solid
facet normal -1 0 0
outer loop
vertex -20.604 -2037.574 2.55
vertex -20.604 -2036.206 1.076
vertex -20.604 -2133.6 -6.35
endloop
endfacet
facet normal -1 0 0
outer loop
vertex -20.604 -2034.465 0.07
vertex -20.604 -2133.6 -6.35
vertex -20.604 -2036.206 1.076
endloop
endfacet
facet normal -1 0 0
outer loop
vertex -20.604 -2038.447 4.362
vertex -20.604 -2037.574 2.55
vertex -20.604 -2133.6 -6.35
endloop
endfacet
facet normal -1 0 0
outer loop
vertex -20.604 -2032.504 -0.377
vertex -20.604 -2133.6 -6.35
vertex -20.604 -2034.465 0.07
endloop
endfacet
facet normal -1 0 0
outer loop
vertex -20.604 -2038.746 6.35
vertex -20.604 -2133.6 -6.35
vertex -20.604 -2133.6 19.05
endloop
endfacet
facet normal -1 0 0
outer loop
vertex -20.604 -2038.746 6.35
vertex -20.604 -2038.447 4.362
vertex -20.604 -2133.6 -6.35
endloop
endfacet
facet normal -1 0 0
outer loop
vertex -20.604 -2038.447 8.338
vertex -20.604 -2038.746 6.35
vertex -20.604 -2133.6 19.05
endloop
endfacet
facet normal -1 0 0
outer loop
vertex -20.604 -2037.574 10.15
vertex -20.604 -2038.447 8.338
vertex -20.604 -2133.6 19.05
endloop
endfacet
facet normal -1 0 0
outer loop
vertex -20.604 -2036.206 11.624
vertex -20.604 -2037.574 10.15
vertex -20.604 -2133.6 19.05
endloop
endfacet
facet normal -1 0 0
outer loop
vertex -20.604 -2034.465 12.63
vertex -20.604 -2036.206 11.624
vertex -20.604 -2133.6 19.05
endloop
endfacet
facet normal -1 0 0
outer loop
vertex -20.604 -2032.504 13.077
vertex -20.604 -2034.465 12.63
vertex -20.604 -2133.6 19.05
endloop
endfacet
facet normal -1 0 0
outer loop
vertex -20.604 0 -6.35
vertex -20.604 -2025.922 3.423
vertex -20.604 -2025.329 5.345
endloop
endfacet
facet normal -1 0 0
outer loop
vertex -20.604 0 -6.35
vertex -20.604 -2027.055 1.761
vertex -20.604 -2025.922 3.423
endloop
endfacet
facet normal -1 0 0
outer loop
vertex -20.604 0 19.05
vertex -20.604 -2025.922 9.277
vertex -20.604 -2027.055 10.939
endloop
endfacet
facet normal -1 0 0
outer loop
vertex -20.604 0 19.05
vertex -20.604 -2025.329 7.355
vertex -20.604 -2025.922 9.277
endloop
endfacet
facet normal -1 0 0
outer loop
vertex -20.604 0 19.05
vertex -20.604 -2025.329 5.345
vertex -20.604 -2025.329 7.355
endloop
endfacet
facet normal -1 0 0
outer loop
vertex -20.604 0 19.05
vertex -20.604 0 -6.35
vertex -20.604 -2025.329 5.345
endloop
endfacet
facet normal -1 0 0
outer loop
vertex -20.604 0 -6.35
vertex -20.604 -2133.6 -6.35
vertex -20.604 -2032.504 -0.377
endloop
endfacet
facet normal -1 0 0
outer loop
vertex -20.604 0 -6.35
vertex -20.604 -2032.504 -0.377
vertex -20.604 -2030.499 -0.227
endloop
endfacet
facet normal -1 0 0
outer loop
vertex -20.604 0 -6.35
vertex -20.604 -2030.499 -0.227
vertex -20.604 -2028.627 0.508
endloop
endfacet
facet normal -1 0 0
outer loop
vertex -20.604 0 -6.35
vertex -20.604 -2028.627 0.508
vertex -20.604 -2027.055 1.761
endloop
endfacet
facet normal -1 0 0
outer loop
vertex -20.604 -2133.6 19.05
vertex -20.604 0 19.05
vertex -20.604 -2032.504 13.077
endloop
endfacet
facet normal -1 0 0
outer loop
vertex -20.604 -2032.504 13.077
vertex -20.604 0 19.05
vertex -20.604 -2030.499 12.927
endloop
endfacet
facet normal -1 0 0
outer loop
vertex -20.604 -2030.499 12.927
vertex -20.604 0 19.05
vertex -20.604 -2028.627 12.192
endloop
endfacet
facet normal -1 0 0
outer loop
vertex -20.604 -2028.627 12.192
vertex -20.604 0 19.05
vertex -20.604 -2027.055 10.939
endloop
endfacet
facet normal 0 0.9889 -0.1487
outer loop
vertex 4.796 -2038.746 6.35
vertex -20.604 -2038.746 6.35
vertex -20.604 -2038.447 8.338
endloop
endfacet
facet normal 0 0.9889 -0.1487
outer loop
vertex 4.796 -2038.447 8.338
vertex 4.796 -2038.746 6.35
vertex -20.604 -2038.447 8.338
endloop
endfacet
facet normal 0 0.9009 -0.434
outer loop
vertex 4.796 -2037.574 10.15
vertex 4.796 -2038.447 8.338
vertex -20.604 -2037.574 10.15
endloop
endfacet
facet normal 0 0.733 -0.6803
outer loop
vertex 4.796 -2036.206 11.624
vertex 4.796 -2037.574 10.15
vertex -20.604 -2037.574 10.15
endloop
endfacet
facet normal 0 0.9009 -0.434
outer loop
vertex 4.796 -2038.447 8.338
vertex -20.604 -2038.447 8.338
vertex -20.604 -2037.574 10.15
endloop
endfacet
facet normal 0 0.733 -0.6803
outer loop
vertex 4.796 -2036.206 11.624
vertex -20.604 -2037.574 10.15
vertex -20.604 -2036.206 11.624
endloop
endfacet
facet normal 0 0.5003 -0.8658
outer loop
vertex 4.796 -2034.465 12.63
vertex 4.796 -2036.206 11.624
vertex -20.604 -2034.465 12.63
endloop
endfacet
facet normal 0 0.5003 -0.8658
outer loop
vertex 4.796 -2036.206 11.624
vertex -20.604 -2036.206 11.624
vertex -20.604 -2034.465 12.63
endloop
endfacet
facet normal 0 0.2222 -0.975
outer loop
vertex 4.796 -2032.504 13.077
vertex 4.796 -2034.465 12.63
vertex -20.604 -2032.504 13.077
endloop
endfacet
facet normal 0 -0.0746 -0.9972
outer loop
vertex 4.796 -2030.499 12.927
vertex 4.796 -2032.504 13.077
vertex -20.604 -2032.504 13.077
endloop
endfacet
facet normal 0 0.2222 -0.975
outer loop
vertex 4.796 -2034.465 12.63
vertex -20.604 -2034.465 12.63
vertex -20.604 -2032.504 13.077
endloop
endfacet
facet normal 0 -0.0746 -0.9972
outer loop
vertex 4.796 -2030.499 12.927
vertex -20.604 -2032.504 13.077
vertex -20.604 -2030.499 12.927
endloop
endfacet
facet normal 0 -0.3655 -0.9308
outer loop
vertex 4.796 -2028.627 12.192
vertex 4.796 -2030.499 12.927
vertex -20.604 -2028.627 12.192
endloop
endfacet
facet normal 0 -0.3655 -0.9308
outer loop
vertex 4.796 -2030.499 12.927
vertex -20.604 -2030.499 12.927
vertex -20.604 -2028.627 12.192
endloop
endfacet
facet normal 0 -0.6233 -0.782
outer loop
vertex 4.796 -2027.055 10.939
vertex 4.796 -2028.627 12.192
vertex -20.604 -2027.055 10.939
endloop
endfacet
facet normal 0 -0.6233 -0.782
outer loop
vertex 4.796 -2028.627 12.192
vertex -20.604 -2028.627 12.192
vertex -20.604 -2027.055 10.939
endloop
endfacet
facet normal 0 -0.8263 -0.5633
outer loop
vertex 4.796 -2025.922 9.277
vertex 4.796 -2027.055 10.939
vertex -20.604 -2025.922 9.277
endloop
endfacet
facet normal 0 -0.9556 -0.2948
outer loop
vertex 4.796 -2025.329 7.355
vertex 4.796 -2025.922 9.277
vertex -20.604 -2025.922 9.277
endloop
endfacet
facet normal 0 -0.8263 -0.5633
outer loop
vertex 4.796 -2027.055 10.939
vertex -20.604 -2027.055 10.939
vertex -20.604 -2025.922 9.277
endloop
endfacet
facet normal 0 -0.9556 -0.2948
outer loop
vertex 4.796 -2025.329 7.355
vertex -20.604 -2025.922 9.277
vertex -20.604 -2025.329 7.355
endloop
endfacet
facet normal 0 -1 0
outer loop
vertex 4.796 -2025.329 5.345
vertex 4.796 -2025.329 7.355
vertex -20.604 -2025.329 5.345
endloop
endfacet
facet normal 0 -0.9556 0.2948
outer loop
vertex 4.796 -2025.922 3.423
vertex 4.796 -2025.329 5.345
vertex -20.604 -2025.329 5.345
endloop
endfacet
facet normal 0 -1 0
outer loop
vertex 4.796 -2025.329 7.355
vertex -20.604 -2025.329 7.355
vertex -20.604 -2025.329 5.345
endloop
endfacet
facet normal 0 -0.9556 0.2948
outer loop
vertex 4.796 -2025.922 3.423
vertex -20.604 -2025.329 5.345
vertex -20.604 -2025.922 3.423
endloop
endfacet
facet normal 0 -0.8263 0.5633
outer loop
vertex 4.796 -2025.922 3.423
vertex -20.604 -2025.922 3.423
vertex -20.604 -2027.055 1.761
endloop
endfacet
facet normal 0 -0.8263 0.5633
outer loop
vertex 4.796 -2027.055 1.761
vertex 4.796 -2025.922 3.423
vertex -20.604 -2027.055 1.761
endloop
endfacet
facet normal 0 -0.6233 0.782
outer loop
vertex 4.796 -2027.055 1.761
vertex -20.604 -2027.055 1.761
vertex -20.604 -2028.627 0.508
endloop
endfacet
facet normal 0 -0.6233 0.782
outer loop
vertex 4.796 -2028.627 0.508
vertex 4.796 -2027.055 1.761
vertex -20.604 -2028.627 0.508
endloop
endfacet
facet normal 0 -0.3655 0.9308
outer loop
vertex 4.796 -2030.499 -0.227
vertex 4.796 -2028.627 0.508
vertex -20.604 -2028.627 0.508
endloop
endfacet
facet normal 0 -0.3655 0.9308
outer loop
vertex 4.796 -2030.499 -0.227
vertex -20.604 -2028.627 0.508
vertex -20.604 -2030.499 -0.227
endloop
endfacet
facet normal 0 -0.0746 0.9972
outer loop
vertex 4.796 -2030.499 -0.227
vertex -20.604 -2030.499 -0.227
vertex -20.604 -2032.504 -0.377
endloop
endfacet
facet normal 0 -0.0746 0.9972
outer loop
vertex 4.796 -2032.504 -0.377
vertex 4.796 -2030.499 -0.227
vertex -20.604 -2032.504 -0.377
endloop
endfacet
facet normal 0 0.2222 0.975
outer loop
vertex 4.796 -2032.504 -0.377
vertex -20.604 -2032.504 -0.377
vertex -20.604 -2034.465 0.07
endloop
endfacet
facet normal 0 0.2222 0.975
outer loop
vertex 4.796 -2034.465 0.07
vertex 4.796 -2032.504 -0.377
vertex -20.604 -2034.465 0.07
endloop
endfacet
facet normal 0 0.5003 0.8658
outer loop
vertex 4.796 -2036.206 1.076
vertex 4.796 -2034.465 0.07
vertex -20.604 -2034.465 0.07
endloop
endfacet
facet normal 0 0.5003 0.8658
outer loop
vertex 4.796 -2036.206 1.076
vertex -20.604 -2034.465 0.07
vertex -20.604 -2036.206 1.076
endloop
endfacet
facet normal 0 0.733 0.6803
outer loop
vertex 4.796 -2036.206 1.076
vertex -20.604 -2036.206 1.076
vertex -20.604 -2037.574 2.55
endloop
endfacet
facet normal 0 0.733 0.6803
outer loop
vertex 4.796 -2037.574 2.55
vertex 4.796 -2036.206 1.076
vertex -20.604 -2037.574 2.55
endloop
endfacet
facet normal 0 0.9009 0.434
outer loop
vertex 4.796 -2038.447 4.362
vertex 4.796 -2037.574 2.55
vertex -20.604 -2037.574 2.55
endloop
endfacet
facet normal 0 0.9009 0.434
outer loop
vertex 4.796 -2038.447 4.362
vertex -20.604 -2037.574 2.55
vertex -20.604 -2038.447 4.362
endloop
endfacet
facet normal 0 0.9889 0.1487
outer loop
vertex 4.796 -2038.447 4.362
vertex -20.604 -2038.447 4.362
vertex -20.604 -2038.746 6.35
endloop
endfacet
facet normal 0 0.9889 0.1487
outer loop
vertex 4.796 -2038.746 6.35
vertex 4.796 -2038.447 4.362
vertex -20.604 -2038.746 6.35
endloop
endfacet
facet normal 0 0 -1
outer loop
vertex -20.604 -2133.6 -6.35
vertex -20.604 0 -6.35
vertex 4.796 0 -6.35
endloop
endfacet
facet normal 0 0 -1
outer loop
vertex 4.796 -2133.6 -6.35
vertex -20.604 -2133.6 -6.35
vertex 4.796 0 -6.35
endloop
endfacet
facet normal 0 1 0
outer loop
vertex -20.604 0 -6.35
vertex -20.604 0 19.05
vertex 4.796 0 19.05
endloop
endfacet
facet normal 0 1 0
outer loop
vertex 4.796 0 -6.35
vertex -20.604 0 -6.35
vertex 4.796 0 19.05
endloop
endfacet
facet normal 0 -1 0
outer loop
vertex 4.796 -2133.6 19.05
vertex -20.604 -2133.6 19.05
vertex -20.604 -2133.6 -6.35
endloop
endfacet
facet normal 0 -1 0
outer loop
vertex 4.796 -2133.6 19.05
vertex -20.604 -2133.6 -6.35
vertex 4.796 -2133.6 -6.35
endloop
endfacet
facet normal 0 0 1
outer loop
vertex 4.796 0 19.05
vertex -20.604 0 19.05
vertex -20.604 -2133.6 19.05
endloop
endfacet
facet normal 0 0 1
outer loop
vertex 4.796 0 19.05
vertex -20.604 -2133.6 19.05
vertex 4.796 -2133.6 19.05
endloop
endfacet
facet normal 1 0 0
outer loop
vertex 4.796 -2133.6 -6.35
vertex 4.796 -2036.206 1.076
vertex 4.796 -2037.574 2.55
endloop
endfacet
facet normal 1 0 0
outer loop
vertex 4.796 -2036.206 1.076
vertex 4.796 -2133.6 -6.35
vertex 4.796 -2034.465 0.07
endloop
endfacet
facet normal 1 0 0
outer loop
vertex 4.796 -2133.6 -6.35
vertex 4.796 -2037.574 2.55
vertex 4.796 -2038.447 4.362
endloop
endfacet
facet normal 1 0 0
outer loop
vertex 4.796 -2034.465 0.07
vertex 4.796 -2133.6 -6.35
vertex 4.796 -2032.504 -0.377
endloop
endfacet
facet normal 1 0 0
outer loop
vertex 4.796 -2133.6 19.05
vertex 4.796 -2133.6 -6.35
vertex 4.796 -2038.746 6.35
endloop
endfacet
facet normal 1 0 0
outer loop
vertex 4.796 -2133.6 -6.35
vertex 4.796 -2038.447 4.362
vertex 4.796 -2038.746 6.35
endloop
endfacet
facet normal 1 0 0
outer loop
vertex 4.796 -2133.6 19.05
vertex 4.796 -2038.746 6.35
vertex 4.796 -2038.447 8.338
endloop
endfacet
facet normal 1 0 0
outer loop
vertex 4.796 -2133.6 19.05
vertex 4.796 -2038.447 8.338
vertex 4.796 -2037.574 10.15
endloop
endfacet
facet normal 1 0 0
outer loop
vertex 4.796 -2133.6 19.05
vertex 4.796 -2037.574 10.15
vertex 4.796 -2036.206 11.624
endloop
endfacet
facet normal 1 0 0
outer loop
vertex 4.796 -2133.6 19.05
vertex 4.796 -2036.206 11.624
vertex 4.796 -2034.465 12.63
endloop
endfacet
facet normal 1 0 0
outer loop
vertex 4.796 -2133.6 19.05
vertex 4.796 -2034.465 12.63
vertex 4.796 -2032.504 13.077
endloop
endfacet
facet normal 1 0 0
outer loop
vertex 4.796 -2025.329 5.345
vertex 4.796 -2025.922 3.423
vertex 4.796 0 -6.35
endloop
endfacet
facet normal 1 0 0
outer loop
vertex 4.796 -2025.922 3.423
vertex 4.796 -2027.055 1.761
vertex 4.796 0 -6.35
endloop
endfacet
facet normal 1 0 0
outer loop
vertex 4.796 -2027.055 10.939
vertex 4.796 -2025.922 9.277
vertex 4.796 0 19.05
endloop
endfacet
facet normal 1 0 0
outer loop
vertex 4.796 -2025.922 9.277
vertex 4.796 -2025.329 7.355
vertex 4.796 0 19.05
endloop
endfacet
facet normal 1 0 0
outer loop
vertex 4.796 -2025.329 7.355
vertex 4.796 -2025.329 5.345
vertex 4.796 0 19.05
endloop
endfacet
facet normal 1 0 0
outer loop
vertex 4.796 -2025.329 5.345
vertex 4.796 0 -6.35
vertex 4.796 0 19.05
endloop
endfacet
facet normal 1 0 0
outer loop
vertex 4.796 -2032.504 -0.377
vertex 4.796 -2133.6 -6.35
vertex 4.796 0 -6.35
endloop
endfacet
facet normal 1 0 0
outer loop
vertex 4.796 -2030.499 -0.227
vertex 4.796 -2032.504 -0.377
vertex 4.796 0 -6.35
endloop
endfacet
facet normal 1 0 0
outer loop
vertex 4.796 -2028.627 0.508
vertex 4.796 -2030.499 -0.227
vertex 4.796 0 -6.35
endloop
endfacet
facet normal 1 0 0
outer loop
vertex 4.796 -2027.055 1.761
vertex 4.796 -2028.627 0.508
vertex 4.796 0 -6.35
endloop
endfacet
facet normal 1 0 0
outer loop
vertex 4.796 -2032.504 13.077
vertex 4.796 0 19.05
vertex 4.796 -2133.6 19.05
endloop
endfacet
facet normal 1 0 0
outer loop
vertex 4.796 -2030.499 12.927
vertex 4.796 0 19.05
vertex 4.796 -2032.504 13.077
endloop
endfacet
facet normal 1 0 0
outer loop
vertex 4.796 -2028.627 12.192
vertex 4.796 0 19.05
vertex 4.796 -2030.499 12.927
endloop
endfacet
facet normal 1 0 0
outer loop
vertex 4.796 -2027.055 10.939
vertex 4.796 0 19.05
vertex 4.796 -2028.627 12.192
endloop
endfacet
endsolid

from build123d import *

# Parameters (mm, degrees)
F0_W     = 25.4
F0_H     = 25.4
F1_DEPTH = 2133.6
F3_D     = 13.49248


with BuildPart() as f1:
    # F0 (on Front) → F1 (new body)
    with BuildSketch(Plane.XZ):
        with Locations((-7.9043106856, 6.35)):
            Rectangle(F0_W, F0_H)
    extrude(amount=F1_DEPTH)

    # F3 (through all)
    with Locations(Plane.YZ.offset(4.7956893144)):
        with Locations((-2032, 6.35)):
            Hole(F3_D / 2)


solid = f1.part
